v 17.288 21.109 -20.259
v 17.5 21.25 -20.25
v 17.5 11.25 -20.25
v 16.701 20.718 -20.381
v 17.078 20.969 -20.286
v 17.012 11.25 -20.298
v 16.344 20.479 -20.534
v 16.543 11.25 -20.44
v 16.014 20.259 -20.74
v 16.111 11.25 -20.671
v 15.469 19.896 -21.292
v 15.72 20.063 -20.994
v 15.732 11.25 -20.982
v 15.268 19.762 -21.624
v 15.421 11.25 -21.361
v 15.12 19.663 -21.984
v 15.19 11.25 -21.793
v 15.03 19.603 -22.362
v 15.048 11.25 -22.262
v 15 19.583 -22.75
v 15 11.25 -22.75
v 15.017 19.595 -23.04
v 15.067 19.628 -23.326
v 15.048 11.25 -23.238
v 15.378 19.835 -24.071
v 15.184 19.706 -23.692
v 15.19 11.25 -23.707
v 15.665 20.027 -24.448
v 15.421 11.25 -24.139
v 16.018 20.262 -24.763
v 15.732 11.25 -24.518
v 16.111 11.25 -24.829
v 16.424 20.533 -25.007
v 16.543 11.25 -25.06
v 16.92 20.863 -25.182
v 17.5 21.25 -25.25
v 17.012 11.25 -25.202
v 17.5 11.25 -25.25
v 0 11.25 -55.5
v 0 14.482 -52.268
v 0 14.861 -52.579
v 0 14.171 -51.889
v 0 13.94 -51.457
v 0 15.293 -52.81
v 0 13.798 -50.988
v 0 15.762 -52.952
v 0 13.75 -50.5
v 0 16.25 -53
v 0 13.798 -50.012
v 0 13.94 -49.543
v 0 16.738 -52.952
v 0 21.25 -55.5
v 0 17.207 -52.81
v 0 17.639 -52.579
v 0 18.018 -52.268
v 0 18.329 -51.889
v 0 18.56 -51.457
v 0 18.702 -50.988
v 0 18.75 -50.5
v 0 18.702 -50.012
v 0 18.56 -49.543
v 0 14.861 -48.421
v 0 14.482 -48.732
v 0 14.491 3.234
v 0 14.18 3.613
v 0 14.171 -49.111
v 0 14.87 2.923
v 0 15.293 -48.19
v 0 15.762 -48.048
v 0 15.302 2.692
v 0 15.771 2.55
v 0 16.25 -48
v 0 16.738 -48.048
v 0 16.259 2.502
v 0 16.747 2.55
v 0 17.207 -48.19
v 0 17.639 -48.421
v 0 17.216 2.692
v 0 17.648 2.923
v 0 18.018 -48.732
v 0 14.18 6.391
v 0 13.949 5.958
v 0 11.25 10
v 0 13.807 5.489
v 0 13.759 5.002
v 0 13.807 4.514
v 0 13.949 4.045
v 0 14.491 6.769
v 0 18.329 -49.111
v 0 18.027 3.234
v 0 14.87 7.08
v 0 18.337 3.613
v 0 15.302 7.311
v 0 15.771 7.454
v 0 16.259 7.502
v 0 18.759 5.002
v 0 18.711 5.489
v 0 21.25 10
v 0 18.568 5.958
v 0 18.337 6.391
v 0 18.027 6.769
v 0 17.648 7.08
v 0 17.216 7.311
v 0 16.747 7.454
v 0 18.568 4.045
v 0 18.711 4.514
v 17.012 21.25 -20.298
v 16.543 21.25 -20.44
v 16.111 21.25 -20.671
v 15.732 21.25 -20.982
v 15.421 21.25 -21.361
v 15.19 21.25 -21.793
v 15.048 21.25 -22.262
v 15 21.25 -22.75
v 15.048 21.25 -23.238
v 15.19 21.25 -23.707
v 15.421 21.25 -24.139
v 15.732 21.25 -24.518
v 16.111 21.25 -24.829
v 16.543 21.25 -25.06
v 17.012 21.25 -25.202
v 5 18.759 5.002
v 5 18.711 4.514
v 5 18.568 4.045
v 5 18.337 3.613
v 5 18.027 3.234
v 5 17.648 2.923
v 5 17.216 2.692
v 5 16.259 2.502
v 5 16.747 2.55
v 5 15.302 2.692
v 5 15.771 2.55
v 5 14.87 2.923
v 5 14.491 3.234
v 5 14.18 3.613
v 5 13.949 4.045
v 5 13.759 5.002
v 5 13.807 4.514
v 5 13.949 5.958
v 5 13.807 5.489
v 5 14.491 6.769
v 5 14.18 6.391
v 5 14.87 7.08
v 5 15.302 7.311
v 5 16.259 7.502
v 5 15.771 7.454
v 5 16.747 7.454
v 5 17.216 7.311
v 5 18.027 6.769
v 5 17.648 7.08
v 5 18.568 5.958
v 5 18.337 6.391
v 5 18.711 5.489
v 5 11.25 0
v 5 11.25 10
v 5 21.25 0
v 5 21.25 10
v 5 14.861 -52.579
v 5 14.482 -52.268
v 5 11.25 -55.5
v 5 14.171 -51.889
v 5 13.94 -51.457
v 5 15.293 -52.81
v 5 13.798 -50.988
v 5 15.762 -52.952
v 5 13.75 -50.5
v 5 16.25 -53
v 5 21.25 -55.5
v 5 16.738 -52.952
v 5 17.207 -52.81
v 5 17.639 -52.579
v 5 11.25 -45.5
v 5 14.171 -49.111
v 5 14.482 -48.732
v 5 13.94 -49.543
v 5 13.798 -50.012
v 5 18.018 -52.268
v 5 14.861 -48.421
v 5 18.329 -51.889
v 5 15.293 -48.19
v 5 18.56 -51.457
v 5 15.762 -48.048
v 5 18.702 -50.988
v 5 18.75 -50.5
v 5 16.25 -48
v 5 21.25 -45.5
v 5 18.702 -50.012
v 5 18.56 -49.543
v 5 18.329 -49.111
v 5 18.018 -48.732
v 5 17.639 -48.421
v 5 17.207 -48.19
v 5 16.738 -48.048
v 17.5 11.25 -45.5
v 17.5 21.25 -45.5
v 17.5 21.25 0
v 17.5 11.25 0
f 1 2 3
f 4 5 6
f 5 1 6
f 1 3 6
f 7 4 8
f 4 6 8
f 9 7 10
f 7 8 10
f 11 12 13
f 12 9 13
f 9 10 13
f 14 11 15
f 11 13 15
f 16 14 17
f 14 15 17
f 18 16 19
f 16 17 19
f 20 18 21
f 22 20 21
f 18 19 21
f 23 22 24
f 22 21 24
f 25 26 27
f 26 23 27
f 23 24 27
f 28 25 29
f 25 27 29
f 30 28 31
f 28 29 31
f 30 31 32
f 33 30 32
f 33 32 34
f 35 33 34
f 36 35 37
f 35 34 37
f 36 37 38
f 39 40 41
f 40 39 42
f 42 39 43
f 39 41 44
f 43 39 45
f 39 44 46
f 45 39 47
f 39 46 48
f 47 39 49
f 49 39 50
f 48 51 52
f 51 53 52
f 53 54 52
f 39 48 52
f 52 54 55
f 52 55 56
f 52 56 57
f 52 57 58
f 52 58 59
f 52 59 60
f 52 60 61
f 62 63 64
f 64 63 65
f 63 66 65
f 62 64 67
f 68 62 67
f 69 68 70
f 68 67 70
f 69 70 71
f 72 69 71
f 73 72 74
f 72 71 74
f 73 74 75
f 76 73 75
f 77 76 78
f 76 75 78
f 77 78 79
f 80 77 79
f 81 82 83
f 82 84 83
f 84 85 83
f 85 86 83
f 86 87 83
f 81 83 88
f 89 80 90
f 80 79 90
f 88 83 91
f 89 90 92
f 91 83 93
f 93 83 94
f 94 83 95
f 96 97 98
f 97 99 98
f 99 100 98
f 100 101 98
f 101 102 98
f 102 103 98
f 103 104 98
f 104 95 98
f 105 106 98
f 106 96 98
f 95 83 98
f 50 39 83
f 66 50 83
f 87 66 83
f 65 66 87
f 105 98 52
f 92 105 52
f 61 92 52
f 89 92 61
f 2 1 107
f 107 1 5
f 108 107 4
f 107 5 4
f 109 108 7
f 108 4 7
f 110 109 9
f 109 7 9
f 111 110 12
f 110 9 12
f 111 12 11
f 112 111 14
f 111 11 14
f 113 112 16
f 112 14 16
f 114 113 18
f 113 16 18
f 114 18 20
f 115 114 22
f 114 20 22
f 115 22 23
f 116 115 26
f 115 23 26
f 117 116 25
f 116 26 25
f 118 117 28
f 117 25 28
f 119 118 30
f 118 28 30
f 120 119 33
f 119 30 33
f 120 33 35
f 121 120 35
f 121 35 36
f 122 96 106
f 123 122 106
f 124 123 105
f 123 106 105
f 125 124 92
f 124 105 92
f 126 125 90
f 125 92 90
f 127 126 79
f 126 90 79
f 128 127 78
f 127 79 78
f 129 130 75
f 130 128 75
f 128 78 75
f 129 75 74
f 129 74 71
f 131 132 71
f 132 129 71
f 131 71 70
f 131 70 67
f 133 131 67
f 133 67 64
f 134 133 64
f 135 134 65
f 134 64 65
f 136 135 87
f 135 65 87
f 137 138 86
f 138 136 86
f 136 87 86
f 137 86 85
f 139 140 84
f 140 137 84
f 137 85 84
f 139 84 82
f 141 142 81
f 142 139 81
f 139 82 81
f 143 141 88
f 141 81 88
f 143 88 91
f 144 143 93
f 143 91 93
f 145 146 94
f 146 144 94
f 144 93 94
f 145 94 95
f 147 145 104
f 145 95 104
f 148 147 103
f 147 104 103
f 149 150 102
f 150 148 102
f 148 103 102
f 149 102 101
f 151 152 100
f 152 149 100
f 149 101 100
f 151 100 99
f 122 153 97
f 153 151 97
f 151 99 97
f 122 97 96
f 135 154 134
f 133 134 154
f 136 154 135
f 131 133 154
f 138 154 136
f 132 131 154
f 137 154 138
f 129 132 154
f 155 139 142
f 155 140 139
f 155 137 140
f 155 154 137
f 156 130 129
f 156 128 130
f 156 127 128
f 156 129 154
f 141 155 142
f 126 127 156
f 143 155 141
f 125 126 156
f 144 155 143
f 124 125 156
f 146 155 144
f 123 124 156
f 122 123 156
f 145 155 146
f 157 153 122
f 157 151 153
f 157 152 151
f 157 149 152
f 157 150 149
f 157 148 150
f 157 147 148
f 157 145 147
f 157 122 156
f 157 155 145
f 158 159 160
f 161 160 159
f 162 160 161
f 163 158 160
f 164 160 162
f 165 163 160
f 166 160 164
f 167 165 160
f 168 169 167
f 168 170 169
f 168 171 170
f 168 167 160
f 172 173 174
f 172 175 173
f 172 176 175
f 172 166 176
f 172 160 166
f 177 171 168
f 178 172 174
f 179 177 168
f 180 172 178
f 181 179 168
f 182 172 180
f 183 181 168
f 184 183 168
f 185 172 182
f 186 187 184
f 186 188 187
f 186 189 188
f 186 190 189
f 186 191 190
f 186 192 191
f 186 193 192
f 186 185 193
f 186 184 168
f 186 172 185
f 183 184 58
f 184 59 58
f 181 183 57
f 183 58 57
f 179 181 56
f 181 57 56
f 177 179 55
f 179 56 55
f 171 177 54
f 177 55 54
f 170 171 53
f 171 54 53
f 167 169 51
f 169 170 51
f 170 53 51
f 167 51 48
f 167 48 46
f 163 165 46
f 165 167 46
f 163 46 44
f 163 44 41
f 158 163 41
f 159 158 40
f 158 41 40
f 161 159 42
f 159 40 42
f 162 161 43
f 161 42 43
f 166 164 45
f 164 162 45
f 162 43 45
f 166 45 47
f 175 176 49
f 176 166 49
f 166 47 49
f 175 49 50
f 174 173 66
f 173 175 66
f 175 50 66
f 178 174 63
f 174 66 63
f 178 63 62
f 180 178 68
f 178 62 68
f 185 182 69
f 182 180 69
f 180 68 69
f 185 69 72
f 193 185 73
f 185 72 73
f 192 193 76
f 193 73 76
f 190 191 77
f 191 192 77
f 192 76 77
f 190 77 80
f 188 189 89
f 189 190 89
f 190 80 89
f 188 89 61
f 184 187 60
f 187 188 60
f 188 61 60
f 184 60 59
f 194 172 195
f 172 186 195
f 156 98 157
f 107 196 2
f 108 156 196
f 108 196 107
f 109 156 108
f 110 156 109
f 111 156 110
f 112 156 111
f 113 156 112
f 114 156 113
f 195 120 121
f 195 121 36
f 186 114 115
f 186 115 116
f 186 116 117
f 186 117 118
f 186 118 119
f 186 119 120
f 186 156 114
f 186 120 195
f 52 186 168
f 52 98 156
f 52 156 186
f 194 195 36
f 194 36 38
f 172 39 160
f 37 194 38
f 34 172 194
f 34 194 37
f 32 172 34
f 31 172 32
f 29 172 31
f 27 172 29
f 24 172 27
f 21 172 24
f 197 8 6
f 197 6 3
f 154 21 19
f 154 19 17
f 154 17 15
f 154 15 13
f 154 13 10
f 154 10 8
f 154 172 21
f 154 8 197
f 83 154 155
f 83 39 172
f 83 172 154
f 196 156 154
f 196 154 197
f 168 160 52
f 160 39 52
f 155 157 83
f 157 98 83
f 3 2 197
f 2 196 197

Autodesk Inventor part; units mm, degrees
ref_plane "YZ Plane" through (0, 0, 0) normal (1, 0, 0) x (0, 1, 0)
ref_plane "XZ Plane" through (0, 0, 0) normal (0, 1, 0) x (-1, 0, 0)
ref_plane "XY Plane" through (0, 0, 0) normal (0, 0, 1) x (1, 0, 0)
sketch "Sketch1" plane through (0, 0, 0) normal (1, 0, 0) x (0, 1, 0)
  line L0 (-6, -12.5) -> (-6, -12.9)
  arc A0 (-6, -12.9) -> (-5.6, -13.3) centre (-5.6, -12.9) ccw
  line L1 (-5.6, -13.3) -> (-4.9, -13.3)
  arc A1 (-4.9, -13.3) -> (-4.7, -13.1) centre (-4.9, -13.1) ccw
  line L2 (-4.7, -13.1) -> (-4.7, -12.85)
  arc A2 (-4.5, -12.65) -> (-4.7, -12.85) centre (-4.5, -12.85) ccw
  line L3 (-4.5, -12.65) -> (-1.8, -12.65)
  arc A3 (-1.4, -13.05) -> (-1.8, -12.65) centre (-1.8, -13.05) ccw
  line L4 (-1.4, -13.05) -> (-1.4, -18.75)
  line L5 (-1.8, -19.15) -> (-4.5, -19.15)
  arc A4 (-1.8, -19.15) -> (-1.4, -18.75) centre (-1.8, -18.75) ccw
  arc A5 (-4.7, -18.95) -> (-4.5, -19.15) centre (-4.5, -18.95) ccw
  line L6 (-4.7, -18.95) -> (-4.7, -18.7)
  arc A6 (-4.7, -18.7) -> (-4.9, -18.5) centre (-4.9, -18.7) ccw
  line L7 (-4.9, -18.5) -> (-5.6, -18.5)
  arc A7 (-5.6, -18.5) -> (-6, -18.9) centre (-5.6, -18.9) ccw
  line L8 (-6, -18.9) -> (-6, -19.5)
  line L9 (-6.5, -6.5) -> (-6.5, -12.5)
  line L10 (-6.5, -12.5) -> (-2.5, -12.5)
  line L11 (-1.05, -19.5) -> (-6.5, -19.5)
  line L12 (-6.5, -19.5) -> (-6.5, -26)
  line L13 (-6.5, -26) -> (-1.05, -26)
  line L14 (-6, -26) -> (-6, -26.6)
  arc A8 (-6, -26.6) -> (-5.6, -27) centre (-5.6, -26.6) ccw
  line L15 (-5.6, -27) -> (-4.9, -27)
  arc A9 (-4.9, -27) -> (-4.7, -26.8) centre (-4.9, -26.8) ccw
  arc A10 (-4.5, -26.35) -> (-4.7, -26.55) centre (-4.5, -26.55) ccw
  line L16 (-4.7, -26.8) -> (-4.7, -26.55)
  line L17 (-4.5, -26.35) -> (-1.8, -26.35)
  arc A11 (-1.4, -26.75) -> (-1.8, -26.35) centre (-1.8, -26.75) ccw
  line L18 (-1.4, -26.75) -> (-1.4, -32.45)
  arc A12 (-1.8, -32.85) -> (-1.4, -32.45) centre (-1.8, -32.45) ccw
  line L19 (-1.8, -32.85) -> (-4.5, -32.85)
  arc A13 (-4.7, -32.65) -> (-4.5, -32.85) centre (-4.5, -32.65) ccw
  line L20 (-4.7, -32.65) -> (-4.7, -32.4)
  arc A14 (-4.7, -32.4) -> (-4.9, -32.2) centre (-4.9, -32.4) ccw
  line L21 (-4.9, -32.2) -> (-5.6, -32.2)
  arc A15 (-5.6, -32.2) -> (-6, -32.6) centre (-5.6, -32.6) ccw
  line L22 (-6, -32.6) -> (-6, -33)
  line L23 (-2.5, -33) -> (-6.5, -33)
  line L24 (-6.5, -33) -> (-6.5, -39)
  line L25 (32.5, 0) -> (0, 0)
  circle A16 centre (0, -6.5) radius 4.75
  circle A17 centre (32.5, -6.5) radius 4.75
  circle A18 centre (0, -39) radius 4.75
  circle A19 centre (32.5, -39) radius 4.75
  line L26 (39, -26) -> (39, -19.5)
  line L27 (39, -12.5) -> (39, -6.5)
  line L28 (39, -39) -> (39, -33)
  line L29 (26.5, -45.5) -> (32.5, -45.5)
  line L30 (0, -45.5) -> (6, -45.5)
  line L31 (13, -45.5) -> (19.5, -45.5)
  circle A20 centre (16.25, -22.75) radius 15
  circle A21 centre (16.2588, 5.0016) radius 2.5
  circle A22 centre (16.25, -50.5) radius 2.5
  circle A23 centre (16.25, -22.75) radius 5
  circle A24 centre (16.25, -22.75) radius 8.45
  line L32 (24.75, -27.6575) -> (24.75, -17.8425)
  line L33 (44, 10) -> (-11.5, 10)
  line L34 (-11.5, 10) -> (-11.5, -55.5)
  line L35 (-11.5, -55.5) -> (44, -55.5)
  line L36 (44, -55.5) -> (44, 10)
  line L37 (-11.5, 30) -> (44, 30)
  line L38 (-11.5, -75.5) -> (-11.5, 30)
  line L39 (44, 30) -> (44, -75.5)
  line L40 (44, -75.5) -> (-11.5, -75.5)
  circle A25 centre (16.25, -65.5) radius 5
  circle A26 centre (16.25, 20) radius 5
  arc A27 (11.25, -55.5) -> (21.25, -55.5) centre (16.25, -55.5) ccw
  line L41 (21.25, 10) -> (21.25, -55.5)
  line L42 (11.25, -55.5) -> (11.25, 10)
  arc A28 (21.25, 10) -> (11.25, 10) centre (16.25, 10) ccw
  line L43 (21.25, -45.5) -> (11.25, -45.5)
  point P0 (21.25, 0)
  point P1 (11.25, 0)
extrude "Extrusion1" add sketch "Sketch1" along normal blind 10 contours L41 A20 L42 L25 | L41 A24 L42 A20 | L41 A23 L42 A24 | L42 A24 L41 A20 | A20 L41 L43 L31 L42 | A23 | L41 A24 L42 A23
extrude "Extrusion2" add sketch "Sketch1" along normal blind 5 contours L25 L42 L33 L41 | L43 L31 L41 L35 L42
sketch "Sketch2" plane through (10, 11.25, 0) normal (0, 0, 1) x (1, 0, 0)
  line L0 (0, 10) -> (0, 0) projected
  circle A0 centre (0, 5) radius 7.5
  line L1 (0, 5) -> (11.155, 5)
  line L2 (-5, 10) -> (0, 10) projected
  line L3 (0, 10) -> (7.5, 5)
  line L4 (7.5, 5) -> (0, 0)
  line L5 (0, 10) -> (7.5, 10)
  line L6 (7.5, 10) -> (0, 5)
  line L7 (0, 5) -> (7.5, 0)
  line L8 (7.5, 0) -> (0, 0)
  point P0 (-10, -11.25)
  point P1 (3.75, 2.5)
  point P2 (3.75, 7.5)
  dimension "d4" = 15
extrude "Extrusion4" add sketch "Sketch2" against normal up to surface (45.5 mm away) contours L3 L6 L0 | L5 A0 L6 L3 | L7 L4 L0 | L5 L6 A0 | L4 L7 A0 L8 | A0 L7 L8
sketch "Sketch3" plane through (0, 11.25, -55.5) normal (0, -1, 0) x (1, 0, 0)
  line L0 (17.5, 55.5) -> (17.5, 10) projected
  circle A0 centre (17.5, 32.75) radius 2.5
  point P0 (0, 55.5)
  dimension "d9" = 5
extrude "Extrusion5" cut sketch "Sketch3" against normal through all
sketch "Sketch4" plane through (5, 11.25, 0) normal (0, 0, 1) x (1, 0, 0)
  line L0 (12.5, 10) -> (10, 8.3333) projected
  line L1 (12.5, 10) -> (12.5, 0)
  line L2 (12.5, 0) -> (5, 5)
  line L3 (5, 5) -> (12.5, 10)
  point P0 (-5, -11.25)
extrude "Extrusion6" add sketch "Sketch4" against normal up to surface (45.5 mm away)
sketch "Sketch5" plane through (0, 11.25, -55.5) normal (0, -1, 0) x (1, 0, 0)
  line L0 (17.5, 35.25) -> (17.5, 30.25) projected
  circle A0 centre (17.5, 32.75) radius 2.5
  point P0 (0, 55.5)
extrude "Extrusion7" cut sketch "Sketch5" against normal through all
properties part number "SoporteTubosInferior_CPY"
